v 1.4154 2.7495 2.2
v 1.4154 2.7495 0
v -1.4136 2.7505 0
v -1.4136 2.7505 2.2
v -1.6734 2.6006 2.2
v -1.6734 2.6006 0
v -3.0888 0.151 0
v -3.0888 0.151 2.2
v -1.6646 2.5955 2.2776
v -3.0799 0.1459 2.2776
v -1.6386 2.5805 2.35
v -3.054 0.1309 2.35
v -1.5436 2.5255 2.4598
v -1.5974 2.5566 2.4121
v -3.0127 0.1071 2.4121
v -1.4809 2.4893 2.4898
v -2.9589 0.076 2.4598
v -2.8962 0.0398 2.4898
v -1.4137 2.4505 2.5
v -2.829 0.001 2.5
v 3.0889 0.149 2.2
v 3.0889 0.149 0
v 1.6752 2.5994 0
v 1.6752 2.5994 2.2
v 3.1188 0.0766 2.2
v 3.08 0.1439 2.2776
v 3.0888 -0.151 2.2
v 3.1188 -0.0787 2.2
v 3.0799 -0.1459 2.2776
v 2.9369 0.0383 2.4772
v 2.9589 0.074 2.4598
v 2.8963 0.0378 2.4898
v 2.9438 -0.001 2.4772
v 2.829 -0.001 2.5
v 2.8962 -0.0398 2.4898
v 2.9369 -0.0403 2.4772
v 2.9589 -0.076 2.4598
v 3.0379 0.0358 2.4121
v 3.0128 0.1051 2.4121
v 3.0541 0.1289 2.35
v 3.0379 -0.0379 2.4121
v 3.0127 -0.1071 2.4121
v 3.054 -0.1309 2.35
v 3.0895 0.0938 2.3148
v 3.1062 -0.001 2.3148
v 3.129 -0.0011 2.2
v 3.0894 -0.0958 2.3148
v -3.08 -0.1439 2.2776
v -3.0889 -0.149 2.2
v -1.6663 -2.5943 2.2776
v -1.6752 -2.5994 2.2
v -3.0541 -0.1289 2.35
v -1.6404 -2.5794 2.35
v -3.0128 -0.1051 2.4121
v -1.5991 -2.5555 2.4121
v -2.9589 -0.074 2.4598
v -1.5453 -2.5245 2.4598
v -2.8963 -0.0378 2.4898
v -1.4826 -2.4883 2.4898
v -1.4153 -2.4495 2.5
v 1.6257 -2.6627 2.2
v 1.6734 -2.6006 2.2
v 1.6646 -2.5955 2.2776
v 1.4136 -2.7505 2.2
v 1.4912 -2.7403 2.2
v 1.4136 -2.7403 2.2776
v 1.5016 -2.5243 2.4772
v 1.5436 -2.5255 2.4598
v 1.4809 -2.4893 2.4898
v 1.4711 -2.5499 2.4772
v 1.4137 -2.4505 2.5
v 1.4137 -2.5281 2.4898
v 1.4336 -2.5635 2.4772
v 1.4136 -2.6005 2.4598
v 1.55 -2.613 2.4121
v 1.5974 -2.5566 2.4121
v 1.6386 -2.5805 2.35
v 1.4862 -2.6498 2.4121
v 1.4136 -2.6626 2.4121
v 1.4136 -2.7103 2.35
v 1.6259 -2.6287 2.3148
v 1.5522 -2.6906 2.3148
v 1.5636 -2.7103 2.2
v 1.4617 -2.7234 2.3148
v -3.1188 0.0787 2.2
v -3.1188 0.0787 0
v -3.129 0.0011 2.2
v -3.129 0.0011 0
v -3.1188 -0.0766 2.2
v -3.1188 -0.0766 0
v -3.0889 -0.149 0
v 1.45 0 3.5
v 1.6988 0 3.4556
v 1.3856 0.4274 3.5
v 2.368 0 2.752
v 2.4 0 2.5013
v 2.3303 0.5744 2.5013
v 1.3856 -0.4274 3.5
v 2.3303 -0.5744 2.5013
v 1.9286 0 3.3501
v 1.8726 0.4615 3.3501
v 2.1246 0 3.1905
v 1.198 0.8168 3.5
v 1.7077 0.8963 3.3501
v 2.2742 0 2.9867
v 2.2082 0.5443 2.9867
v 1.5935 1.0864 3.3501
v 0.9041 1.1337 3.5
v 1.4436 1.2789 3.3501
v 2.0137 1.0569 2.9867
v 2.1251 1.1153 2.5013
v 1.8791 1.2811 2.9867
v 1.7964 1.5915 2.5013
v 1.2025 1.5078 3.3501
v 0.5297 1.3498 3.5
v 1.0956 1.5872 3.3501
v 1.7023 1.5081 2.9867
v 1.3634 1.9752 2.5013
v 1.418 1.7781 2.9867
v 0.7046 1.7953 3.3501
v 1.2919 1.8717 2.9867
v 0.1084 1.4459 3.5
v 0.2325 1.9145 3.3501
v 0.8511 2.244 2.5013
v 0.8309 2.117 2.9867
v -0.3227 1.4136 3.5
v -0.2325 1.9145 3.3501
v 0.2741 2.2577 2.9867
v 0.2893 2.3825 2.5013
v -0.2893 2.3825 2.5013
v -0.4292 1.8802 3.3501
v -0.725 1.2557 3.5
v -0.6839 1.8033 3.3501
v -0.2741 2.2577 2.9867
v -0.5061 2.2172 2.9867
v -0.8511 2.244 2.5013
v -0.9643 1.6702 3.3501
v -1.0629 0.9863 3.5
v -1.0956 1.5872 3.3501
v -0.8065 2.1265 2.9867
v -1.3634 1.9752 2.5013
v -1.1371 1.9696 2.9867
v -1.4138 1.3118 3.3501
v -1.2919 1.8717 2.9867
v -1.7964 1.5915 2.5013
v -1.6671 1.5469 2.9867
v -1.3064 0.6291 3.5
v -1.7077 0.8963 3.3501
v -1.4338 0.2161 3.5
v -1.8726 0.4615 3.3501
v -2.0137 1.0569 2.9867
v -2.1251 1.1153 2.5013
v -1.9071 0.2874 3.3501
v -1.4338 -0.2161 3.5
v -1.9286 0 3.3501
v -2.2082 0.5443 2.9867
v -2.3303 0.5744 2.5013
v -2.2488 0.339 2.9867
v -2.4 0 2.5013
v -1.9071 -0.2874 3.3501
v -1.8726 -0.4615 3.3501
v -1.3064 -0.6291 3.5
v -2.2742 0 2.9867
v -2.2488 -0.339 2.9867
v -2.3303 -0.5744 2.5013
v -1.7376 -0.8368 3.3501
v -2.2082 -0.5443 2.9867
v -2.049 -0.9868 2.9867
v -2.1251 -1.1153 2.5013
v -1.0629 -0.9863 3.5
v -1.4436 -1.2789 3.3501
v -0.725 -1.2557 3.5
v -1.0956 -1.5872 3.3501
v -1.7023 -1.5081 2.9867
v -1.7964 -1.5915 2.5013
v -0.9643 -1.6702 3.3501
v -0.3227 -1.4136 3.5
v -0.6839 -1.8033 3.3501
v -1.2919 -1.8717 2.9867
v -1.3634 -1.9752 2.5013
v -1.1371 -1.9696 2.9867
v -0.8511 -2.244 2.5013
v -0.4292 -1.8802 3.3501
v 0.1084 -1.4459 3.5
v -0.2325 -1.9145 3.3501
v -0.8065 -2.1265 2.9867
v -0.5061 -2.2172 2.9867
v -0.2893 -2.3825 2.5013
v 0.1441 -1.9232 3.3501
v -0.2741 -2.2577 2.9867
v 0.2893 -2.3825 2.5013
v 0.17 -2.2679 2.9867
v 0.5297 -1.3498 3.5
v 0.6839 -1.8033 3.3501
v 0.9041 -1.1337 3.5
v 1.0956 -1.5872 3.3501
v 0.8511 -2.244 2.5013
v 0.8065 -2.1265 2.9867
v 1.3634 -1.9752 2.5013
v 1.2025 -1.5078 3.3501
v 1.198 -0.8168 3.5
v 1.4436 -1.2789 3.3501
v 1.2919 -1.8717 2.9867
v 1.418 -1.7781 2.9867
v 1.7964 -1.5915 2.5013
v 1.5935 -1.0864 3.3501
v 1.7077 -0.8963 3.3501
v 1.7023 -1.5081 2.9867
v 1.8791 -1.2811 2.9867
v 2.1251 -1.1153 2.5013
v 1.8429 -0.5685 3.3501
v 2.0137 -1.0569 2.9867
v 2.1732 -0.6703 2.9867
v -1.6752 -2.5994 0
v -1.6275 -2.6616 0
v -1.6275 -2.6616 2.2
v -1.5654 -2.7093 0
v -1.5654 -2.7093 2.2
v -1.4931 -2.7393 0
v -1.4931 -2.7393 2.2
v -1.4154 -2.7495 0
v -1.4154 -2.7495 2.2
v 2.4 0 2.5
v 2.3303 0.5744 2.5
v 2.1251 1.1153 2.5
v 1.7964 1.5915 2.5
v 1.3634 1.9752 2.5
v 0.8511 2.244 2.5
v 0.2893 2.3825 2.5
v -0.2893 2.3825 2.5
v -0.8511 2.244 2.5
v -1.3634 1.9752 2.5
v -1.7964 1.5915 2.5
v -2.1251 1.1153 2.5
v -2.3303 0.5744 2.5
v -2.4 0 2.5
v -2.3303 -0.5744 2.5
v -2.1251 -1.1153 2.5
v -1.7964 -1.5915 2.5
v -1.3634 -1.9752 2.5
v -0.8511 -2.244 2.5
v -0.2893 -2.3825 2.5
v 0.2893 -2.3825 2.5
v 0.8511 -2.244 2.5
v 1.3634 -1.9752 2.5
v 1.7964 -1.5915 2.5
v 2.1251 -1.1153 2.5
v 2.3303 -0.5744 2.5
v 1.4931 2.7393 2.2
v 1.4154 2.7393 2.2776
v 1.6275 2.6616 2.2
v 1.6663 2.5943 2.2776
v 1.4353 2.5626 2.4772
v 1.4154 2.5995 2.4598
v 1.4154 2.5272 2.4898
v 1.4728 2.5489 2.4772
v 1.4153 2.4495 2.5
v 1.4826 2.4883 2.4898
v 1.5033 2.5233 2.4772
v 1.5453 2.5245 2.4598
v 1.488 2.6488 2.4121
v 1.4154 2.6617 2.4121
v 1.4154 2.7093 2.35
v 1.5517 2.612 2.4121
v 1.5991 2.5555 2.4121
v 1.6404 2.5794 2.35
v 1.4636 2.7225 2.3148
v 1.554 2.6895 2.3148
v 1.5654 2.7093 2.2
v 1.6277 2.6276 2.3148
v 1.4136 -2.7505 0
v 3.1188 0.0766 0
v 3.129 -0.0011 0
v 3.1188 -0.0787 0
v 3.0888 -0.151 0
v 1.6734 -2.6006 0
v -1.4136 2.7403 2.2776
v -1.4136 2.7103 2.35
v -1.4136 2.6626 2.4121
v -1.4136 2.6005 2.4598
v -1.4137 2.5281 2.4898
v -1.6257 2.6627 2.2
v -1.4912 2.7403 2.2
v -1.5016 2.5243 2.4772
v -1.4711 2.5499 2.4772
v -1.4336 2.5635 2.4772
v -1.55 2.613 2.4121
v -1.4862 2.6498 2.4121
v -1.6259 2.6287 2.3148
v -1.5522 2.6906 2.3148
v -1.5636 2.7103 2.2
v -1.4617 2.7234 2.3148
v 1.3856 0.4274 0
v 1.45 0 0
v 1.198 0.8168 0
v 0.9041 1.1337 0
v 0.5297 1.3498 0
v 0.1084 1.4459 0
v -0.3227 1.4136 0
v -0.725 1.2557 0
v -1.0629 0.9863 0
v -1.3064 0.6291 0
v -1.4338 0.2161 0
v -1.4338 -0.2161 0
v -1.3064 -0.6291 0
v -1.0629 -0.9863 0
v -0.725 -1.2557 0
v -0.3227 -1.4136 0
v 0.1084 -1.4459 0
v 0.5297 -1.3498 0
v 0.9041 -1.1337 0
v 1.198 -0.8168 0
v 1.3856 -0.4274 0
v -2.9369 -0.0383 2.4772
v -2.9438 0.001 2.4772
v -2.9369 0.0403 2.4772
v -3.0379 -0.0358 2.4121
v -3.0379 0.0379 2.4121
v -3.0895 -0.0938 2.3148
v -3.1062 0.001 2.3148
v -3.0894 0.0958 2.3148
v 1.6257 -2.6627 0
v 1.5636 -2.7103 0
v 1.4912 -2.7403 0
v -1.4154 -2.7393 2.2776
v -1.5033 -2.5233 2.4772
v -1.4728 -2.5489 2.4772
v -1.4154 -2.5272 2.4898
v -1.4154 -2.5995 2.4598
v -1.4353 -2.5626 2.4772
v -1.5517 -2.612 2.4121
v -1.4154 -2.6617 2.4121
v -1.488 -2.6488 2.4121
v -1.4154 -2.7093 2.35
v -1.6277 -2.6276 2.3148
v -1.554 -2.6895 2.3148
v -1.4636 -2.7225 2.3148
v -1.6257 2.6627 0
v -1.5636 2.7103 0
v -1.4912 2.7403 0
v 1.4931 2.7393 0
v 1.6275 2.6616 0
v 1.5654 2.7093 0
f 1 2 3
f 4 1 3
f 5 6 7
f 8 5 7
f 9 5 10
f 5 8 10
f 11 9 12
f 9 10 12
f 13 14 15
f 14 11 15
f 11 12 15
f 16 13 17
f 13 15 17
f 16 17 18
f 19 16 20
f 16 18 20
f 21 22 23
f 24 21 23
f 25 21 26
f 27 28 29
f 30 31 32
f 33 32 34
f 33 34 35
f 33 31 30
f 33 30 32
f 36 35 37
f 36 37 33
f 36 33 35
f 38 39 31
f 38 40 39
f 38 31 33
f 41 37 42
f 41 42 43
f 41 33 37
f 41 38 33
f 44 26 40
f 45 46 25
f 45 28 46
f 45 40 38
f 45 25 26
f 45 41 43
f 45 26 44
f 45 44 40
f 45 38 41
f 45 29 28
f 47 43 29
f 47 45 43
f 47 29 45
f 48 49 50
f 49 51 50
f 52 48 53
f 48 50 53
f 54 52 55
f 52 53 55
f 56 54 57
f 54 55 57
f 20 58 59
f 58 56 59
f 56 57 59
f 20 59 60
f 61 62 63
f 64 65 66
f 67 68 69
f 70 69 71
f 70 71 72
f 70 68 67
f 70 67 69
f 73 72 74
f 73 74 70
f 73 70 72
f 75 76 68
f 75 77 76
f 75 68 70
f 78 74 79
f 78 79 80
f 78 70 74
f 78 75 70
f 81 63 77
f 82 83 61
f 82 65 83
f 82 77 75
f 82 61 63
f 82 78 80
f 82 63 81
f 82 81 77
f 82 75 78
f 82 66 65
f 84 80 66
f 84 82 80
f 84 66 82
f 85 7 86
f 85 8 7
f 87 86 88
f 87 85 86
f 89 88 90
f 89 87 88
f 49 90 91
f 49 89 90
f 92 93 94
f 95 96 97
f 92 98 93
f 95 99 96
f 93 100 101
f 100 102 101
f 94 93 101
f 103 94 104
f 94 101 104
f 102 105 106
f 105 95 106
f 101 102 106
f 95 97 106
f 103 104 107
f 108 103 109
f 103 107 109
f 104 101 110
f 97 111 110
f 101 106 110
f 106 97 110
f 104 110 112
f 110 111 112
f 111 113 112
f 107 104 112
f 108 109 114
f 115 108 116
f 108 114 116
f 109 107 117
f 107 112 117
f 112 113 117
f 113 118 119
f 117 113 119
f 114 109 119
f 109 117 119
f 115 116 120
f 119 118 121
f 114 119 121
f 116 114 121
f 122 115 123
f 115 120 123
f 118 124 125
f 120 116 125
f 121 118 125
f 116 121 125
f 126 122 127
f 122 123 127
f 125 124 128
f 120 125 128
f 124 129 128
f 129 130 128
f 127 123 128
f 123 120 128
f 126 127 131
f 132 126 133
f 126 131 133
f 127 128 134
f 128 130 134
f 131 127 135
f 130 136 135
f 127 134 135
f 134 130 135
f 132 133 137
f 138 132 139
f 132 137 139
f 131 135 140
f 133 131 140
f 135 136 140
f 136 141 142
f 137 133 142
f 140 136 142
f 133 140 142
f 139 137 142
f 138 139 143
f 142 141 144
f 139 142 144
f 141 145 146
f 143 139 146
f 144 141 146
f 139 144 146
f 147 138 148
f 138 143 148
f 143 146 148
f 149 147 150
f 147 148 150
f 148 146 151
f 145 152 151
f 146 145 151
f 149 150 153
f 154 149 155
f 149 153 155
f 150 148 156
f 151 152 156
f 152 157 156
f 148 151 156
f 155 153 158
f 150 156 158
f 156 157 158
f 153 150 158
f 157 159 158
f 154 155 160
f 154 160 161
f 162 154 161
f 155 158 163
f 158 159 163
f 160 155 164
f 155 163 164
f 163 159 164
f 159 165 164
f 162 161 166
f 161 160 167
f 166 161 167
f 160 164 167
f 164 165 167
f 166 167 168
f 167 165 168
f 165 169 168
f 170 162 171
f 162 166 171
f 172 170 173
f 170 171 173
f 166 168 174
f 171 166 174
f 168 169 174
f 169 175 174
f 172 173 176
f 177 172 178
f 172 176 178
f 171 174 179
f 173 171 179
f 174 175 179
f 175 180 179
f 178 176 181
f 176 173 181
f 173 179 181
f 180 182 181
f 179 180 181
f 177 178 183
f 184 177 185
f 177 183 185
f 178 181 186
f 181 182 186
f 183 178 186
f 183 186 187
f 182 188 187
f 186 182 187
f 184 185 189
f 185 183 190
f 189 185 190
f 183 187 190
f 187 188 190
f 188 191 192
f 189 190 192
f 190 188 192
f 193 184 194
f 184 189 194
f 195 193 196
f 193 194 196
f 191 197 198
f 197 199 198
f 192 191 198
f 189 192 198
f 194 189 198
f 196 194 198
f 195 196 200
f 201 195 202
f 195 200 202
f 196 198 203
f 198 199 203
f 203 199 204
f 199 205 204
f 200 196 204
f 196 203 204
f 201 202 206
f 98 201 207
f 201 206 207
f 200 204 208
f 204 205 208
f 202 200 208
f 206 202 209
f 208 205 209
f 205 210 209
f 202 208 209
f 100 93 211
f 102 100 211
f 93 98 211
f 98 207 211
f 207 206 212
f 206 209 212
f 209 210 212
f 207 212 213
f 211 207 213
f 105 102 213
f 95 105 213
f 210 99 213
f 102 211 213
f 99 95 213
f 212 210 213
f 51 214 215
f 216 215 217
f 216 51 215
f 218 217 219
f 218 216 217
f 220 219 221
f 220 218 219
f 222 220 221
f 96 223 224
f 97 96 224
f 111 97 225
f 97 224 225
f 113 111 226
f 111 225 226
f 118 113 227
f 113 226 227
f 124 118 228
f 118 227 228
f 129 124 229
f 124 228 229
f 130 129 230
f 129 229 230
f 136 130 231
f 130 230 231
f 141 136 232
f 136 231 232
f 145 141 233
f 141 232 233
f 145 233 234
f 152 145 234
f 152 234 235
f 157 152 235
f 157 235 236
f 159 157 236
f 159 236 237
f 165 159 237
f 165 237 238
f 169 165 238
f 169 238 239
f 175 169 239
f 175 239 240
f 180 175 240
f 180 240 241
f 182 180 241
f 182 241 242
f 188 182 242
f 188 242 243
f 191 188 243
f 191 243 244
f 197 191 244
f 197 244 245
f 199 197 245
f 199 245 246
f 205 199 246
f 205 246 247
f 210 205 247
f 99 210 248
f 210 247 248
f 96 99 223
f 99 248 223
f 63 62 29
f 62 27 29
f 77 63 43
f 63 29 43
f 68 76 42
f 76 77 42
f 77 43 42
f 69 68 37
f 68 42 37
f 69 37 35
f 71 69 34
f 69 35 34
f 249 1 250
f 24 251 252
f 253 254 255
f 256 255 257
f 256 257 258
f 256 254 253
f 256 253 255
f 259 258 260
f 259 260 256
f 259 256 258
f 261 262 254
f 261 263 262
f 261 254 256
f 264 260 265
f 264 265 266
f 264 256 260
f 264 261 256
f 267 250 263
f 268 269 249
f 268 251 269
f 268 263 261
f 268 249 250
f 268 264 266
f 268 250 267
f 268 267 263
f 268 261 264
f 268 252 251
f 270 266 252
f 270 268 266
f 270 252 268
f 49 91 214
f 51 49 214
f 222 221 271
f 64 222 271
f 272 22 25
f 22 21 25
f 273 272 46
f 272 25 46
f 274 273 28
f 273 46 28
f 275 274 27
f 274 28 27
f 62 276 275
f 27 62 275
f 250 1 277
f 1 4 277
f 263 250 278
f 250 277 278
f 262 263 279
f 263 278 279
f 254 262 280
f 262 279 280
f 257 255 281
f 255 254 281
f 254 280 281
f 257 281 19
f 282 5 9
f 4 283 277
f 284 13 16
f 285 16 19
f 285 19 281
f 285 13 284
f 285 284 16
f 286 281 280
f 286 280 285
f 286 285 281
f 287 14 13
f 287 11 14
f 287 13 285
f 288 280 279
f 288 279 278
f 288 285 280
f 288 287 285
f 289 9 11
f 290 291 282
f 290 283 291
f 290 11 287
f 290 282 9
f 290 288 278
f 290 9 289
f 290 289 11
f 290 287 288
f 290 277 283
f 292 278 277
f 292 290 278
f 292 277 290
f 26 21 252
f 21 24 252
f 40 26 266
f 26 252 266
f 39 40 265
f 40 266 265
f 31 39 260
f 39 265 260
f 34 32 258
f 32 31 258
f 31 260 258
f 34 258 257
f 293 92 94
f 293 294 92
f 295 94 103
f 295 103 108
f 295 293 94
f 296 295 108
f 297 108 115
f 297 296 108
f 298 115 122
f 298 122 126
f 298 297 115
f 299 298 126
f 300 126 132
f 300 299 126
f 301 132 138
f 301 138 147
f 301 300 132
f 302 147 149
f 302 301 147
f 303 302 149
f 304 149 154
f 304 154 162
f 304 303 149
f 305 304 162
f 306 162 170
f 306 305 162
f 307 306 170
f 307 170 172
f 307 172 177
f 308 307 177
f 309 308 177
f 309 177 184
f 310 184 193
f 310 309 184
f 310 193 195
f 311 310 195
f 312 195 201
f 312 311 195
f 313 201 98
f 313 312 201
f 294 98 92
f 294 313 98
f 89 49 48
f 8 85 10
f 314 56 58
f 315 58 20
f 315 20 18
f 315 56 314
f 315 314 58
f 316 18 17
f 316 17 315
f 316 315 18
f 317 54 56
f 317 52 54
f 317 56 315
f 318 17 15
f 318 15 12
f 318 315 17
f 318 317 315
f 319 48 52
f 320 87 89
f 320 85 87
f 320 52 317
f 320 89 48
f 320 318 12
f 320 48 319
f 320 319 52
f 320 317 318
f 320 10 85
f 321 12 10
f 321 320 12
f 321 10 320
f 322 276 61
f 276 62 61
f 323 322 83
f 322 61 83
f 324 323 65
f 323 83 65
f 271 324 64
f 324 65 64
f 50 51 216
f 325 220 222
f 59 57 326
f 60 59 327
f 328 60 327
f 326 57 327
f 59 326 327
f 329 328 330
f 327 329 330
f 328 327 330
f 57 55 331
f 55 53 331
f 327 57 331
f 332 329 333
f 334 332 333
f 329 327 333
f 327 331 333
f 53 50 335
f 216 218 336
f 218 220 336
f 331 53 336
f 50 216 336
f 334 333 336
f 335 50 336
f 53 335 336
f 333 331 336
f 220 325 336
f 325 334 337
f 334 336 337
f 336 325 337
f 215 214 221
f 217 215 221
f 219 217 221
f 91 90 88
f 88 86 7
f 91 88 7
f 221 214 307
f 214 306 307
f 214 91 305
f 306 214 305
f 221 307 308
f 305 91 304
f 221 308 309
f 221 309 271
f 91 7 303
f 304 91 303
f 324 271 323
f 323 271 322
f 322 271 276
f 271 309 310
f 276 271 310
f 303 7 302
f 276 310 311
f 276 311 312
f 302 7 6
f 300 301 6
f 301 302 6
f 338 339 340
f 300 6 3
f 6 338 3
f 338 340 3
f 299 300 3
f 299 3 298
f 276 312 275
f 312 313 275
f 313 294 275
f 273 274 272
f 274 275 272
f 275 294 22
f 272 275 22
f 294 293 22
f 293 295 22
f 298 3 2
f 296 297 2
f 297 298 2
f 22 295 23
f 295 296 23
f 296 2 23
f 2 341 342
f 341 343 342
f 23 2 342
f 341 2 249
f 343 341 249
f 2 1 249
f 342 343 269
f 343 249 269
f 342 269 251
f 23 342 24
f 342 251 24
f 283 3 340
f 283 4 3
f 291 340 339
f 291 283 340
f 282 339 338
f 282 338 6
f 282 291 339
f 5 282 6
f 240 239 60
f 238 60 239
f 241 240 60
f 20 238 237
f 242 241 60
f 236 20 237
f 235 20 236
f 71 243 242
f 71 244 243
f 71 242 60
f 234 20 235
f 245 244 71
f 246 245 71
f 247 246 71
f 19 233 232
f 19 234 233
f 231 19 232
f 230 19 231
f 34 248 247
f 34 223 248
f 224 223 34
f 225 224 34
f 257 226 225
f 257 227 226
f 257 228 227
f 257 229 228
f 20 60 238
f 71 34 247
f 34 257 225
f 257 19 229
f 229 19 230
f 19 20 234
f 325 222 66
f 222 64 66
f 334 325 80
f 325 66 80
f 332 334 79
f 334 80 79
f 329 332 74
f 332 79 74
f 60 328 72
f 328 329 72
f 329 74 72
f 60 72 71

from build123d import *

# Parameters (mm, degrees)
F0_R     = 1.45
F1_DEPTH = 2.5
F3_R     = 2.4
F3_R_2   = 1.45
F4_DEPTH = 1
F5_R     = 0.3


# Not quite as in the source:
# - a fillet or chamfer that OpenCascade refuses, or shapes differently, is made with other operations: its cross-section is extruded or revolved along the edge and cut away or added


with BuildPart() as f1:
    # F0 (on Top) → F1 (new body)
    with BuildSketch(Plane.XY):
        Polygon((-1.5886400056, -2.7494647235), (1.5867862946, -2.7505349641), (3.1754263002, -0.0010702406), (1.5886400056, 2.7494647235), (-1.5867862946, 2.7505349641), (-3.1754263002, 0.0010702406), align=None)
        Circle(F0_R, mode=Mode.SUBTRACT)
    extrude(amount=F1_DEPTH)

    # F3 (on offset) → F4 (join)
    with BuildSketch(Plane.XY.offset(2.5)):
        Circle(F3_R)
        Circle(F3_R_2, mode=Mode.SUBTRACT)
    extrude(amount=F4_DEPTH)

    # F5
    f5_edges = [f1.edges().sort_by_distance(p)[0] for p in [
        (-2.382033, -1.374197, 2.5),
        (-2.381106, 1.375803, 2.5),
        (0.000927, 2.75, 2.5),
        (2.382033, 1.374197, 2.5),
        (2.381106, -1.375803, 2.5),
        (-0.000927, -2.75, 2.5),
        (3.175426, -0.00107, 1.25),
        (1.58864, 2.749465, 1.25),
        (-1.586786, 2.750535, 1.25),
        (-3.175426, 0.00107, 1.25),
        (-1.58864, -2.749465, 1.25),
        (1.586786, -2.750535, 1.25),
    ]]
    fillet(f5_edges, radius=F5_R)

    # F6: fillet of radius 1 on 1 edges, made by hand

    # F6_s1 → F6_t2 (revolve, cut)
    with BuildSketch(Plane.XZ):
        with BuildLine():
            ThreePointArc((1.45, 3.5), (2.1245688373, 3.1904532198), (2.4, 2.5012507822))
            Line((2.4, 2.5012507822), (2.4, 3.5))
            Line((2.4, 3.5), (1.45, 3.5))
        make_face()
    revolve(axis=Axis((0, 0, 3.5), (0, 0, 1)), mode=Mode.SUBTRACT)


solid = f1.part
